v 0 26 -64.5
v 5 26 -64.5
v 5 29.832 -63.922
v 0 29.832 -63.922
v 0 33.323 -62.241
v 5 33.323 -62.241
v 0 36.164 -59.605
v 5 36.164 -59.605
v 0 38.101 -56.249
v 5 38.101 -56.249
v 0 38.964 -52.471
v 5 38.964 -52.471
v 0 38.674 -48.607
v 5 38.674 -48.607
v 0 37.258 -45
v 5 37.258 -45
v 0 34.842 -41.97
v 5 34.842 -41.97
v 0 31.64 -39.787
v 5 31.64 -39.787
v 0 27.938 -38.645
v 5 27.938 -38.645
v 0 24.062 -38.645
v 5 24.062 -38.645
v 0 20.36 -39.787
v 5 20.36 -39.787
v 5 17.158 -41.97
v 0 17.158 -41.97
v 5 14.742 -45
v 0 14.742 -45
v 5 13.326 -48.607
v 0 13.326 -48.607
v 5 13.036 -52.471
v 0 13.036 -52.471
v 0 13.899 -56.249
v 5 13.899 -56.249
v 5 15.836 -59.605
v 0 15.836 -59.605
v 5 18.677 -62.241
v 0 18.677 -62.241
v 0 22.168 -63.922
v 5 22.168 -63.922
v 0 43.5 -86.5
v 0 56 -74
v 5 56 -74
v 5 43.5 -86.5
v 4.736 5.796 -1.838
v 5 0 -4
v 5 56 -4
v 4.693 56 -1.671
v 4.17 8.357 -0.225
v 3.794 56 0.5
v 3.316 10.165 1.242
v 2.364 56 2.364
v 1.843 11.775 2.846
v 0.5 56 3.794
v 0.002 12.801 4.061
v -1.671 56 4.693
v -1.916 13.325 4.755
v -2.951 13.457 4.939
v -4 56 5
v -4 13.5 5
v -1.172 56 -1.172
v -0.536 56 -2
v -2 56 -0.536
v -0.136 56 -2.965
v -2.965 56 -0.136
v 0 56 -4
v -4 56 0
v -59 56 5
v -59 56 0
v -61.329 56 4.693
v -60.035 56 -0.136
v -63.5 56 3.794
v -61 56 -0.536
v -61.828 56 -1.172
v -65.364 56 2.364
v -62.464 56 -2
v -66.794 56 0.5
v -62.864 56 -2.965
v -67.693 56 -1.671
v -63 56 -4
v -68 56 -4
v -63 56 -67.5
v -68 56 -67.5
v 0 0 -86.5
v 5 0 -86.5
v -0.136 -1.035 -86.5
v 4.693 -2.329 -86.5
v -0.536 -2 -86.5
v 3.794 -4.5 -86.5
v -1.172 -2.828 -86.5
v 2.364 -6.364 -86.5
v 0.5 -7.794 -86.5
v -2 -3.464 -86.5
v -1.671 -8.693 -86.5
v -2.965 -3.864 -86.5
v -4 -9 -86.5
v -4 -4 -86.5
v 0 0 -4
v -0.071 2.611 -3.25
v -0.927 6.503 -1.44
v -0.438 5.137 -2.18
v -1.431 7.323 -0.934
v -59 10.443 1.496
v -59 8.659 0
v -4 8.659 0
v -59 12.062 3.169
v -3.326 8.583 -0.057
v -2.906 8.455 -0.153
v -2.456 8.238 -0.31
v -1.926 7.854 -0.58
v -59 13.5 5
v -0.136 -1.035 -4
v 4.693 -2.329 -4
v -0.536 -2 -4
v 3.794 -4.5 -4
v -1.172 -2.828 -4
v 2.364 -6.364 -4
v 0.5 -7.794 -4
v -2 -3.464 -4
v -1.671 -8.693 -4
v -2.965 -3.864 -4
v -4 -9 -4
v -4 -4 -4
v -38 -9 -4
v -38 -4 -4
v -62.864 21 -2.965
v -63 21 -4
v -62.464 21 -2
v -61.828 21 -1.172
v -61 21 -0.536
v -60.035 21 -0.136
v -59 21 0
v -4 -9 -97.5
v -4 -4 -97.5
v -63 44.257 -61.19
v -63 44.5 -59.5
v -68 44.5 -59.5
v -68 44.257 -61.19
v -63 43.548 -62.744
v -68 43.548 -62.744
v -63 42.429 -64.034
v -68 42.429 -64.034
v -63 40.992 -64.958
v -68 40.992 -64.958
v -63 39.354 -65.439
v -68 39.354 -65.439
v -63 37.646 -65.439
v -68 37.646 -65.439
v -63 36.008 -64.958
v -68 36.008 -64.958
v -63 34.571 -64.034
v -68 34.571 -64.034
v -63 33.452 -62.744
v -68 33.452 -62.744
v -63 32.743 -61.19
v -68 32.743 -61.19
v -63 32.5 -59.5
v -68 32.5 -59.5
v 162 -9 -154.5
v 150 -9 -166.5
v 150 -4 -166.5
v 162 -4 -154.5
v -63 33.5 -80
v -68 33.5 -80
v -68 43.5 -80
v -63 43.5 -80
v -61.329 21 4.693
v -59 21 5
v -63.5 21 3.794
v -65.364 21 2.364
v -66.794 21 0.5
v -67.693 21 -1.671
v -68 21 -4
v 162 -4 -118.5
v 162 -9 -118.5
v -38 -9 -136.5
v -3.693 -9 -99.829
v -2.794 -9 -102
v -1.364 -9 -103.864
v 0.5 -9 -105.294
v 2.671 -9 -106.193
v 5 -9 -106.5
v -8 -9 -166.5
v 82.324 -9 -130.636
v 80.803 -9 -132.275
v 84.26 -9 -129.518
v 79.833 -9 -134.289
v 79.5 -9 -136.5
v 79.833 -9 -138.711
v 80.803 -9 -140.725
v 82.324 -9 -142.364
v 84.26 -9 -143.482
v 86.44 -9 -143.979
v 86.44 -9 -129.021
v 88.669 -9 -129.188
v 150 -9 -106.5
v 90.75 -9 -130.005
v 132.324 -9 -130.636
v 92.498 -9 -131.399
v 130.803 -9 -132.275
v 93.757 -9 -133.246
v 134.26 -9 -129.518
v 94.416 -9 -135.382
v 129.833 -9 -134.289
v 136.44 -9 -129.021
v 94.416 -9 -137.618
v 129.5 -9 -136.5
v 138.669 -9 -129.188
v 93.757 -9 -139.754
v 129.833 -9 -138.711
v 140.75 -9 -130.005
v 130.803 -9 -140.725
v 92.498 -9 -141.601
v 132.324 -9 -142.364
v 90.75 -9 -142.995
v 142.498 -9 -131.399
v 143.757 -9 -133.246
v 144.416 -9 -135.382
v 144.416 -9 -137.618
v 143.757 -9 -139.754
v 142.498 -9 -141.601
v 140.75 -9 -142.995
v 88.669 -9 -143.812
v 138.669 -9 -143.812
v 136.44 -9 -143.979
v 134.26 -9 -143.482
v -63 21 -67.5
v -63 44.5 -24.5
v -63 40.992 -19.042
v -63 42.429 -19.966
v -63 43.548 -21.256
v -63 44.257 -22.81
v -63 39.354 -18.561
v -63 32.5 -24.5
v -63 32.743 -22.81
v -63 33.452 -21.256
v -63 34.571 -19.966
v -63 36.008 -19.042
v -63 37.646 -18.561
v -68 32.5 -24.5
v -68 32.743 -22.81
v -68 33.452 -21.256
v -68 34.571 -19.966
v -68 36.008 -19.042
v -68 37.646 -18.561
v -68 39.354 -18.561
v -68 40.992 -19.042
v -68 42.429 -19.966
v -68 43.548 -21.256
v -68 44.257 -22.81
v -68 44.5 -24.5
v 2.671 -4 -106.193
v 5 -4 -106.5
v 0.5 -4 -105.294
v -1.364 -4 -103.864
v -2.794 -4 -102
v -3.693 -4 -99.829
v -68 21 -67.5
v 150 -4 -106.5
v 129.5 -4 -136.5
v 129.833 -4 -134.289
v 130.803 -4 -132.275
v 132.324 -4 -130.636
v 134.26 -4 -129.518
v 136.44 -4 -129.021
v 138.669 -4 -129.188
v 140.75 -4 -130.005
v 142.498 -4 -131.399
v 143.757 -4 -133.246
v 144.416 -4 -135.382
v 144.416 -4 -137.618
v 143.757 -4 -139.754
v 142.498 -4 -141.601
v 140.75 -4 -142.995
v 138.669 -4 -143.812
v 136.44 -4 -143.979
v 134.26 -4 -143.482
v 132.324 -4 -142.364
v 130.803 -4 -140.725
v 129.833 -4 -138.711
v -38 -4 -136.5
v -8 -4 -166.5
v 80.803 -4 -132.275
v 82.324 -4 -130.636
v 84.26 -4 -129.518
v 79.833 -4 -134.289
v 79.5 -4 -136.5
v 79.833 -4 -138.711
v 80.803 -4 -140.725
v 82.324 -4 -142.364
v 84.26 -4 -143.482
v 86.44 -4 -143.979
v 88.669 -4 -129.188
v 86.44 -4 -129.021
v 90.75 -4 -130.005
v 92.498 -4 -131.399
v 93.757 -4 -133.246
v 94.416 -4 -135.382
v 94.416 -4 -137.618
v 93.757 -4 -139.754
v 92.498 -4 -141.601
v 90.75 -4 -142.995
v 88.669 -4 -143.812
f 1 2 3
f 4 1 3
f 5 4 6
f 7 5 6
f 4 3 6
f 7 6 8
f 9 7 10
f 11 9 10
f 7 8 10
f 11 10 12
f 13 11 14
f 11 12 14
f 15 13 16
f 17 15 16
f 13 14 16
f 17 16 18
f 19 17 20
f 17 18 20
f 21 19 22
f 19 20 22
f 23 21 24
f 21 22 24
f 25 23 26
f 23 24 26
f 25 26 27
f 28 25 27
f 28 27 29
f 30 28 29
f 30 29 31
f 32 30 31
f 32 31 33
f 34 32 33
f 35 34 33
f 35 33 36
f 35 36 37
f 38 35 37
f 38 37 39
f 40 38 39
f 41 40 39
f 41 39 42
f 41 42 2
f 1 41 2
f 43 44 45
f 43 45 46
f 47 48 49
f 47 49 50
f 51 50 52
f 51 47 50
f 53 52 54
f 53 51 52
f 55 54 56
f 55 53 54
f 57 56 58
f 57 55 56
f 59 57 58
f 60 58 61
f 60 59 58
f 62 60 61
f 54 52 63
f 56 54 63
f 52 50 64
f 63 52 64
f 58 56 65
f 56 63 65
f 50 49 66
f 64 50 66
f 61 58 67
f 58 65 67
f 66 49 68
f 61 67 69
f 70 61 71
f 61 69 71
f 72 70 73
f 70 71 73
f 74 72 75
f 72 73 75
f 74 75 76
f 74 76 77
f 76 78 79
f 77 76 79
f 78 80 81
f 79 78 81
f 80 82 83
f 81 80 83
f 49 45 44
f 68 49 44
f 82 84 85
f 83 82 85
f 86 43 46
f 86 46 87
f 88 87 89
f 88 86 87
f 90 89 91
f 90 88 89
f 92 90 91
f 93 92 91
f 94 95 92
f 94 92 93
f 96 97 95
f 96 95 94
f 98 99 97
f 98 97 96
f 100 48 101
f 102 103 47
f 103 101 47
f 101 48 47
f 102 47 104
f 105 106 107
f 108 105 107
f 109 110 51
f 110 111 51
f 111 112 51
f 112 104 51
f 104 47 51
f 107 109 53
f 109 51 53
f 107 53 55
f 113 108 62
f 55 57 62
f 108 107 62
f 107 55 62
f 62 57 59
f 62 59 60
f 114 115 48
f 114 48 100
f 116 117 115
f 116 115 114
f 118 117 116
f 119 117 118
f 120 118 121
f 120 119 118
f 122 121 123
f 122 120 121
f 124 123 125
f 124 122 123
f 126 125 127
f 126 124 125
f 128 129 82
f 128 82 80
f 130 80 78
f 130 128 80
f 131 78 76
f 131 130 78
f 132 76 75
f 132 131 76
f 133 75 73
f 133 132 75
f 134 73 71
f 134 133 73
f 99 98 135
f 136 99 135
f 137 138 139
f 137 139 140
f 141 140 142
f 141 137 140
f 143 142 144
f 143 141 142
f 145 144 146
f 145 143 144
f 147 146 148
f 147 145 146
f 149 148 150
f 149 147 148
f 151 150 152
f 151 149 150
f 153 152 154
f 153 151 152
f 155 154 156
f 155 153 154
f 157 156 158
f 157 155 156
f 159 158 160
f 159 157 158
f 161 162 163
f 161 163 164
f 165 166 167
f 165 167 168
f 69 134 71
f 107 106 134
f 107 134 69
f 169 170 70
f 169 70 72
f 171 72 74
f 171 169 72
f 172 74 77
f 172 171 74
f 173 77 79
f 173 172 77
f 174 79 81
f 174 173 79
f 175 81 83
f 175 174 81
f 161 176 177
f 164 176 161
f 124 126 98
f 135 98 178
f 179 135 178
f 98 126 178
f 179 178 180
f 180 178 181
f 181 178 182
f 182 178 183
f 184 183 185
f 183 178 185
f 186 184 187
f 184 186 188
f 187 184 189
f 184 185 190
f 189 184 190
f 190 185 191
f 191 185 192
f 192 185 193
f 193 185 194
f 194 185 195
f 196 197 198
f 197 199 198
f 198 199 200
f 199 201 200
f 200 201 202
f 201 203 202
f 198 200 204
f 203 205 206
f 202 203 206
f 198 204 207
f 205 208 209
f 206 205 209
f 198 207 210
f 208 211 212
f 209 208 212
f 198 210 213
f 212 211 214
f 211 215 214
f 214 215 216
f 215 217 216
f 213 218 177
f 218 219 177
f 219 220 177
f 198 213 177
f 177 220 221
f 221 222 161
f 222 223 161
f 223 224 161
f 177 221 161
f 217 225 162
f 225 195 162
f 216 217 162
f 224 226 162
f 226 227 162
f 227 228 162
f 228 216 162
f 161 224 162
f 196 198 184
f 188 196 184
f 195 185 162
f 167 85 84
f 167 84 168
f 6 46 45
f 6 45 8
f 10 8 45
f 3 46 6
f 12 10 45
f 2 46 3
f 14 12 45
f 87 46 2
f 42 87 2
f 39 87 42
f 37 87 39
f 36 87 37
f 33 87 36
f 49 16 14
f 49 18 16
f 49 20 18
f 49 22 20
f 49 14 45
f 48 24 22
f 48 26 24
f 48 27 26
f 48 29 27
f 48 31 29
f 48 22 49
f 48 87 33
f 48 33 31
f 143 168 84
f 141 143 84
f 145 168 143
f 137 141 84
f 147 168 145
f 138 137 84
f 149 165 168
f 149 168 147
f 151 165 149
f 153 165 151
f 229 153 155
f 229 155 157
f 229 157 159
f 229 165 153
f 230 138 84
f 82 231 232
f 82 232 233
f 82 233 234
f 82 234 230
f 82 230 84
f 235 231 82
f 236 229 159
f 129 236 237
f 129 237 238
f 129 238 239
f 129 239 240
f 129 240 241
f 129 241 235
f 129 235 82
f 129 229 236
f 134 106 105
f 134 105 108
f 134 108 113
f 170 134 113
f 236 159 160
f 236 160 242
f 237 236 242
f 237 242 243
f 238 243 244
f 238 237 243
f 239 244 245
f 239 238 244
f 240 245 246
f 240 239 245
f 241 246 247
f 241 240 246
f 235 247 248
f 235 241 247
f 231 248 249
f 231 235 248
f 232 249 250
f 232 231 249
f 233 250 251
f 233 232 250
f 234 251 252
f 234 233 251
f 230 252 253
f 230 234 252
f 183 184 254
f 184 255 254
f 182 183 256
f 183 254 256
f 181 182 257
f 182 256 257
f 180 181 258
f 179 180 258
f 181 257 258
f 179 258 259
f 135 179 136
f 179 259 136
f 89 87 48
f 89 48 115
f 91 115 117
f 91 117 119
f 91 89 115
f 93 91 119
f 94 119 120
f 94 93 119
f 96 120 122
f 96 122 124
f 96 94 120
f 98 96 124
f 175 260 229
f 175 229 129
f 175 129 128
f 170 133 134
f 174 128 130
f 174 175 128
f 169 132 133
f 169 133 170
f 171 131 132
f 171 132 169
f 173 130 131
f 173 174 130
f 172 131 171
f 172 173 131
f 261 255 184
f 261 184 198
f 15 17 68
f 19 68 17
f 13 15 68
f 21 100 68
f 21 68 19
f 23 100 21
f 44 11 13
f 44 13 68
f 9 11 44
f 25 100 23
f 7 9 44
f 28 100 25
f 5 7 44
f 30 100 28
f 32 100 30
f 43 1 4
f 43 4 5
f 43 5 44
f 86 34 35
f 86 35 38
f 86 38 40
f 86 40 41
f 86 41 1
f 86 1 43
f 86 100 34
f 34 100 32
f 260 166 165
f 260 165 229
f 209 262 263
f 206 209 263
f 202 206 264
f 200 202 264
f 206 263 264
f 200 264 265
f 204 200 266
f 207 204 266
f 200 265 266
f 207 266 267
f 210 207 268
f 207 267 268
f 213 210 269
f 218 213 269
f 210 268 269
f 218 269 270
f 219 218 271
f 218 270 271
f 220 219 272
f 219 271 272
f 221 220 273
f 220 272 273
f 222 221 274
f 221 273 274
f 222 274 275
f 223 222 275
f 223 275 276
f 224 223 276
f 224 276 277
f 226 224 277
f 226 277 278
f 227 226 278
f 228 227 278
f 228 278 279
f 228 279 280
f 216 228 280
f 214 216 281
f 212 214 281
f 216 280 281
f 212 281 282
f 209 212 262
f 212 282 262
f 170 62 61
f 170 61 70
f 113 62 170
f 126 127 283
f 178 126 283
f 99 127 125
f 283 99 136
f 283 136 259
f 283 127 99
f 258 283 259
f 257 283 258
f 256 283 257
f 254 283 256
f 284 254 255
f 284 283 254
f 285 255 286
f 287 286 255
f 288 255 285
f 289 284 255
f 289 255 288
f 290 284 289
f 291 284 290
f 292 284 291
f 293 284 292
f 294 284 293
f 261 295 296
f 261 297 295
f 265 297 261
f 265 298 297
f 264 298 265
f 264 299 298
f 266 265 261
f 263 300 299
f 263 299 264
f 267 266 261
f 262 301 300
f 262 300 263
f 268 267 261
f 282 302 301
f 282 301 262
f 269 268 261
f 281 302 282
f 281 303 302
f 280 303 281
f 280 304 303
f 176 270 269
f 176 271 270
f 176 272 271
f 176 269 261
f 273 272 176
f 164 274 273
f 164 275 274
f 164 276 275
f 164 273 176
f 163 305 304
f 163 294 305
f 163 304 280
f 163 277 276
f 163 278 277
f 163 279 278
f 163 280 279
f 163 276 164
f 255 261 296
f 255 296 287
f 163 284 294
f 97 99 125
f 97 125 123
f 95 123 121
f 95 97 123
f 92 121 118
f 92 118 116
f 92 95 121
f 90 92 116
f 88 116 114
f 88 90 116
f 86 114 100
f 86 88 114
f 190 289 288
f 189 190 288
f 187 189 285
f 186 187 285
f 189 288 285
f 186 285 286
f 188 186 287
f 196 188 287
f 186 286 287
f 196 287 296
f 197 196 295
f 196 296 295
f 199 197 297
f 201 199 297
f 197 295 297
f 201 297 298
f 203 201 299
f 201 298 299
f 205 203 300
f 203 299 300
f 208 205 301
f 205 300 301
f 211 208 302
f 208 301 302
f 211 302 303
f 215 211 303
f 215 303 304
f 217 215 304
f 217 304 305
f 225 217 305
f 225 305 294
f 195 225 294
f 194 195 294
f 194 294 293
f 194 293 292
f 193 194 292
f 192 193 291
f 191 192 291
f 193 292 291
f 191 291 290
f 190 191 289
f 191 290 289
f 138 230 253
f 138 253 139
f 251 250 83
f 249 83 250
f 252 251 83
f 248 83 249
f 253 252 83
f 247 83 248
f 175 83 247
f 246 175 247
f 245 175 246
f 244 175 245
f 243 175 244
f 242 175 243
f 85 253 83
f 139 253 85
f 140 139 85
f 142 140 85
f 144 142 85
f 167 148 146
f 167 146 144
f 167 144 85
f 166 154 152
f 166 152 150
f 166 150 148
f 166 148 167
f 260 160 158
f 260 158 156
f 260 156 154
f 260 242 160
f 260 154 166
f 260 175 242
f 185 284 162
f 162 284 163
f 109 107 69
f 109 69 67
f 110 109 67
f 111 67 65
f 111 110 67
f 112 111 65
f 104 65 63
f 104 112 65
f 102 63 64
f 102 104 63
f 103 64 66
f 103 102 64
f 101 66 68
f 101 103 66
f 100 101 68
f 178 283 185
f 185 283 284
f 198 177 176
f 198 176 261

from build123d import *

# Parameters (mm, degrees)
BASE_FLANGE1_DEPTH      = 56
SKETCH9_W               = 85
SKETCH9_H               = 21
CUT_EXTRUDE2_DEPTH      = 9
CUT_EXTRUDE3_DEPTH      = 10
SKETCH11_R              = 13
CUT_EXTRUDE4_DEPTH      = 10
BREAK_CORNER1_START     = -68
BREAK_CORNER1_DEPTH     = 5
BREAK_CORNER1_2_DEPTH   = 5
EDGE_FLANGE1_DEPTH      = 82.5
EDGE_FLANGE1_START      = -5
EDGE_FLANGE1_PROFILE_W  = 102.5
EDGE_FLANGE1_PROFILE_H  = 34
EDGE_FLANGE1_FLAT_DEPTH = 5
SKETCH15_W              = 200
SKETCH15_H              = 60
SKETCH15_R              = 7.5
BOSS_EXTRUDE1_DEPTH     = 5
BREAK_CORNER2_START     = -144.603336753
BREAK_CORNER2_OUTLINE_W = 46
BREAK_CORNER2_OUTLINE_H = 8
BREAK_CORNER2_DEPTH     = 21.213203436
BREAK_CORNER3_START     = -9
BREAK_CORNER3_DEPTH     = 5
CUT_EXTRUDE5_DEPTH      = 236.599766553
FILLET1_R               = 9


# Read off the part's stored shape, not the designer's step: Break-Corner1, Break-Corner2, Break-Corner3
# Sheet-metal steps are written as plain solids
with BuildPart() as part:
    # Sketch1 → Base-Flange1 (new body)
    with BuildSketch(Plane(origin=(0, 0, 0), x_dir=(1, 0, 0), z_dir=(0, 1, 0))):
        with BuildLine():
            Line((-63, 80), (-63, 4))
            ThreePointArc((-63, 4), (-61.828427125, 1.171572875), (-59, 0))
            Line((-59, 0), (-4, 0))
            ThreePointArc((-4, 0), (-1.171572875, 1.171572875), (0, 4))
            Line((0, 4), (0, 86.5))
            Line((0, 86.5), (5, 86.5))
            Line((5, 86.5), (5, 4))
            ThreePointArc((5, 4), (2.363961031, -2.363961031), (-4, -5))
            Line((-4, -5), (-59, -5))
            ThreePointArc((-59, -5), (-65.363961031, -2.363961031), (-68, 4))
            Line((-68, 4), (-68, 80))
            Line((-68, 80), (-63, 80))
        make_face()
    extrude(amount=BASE_FLANGE1_DEPTH)

    # Sketch9 → Cut-Extrude2 (cut)
    with BuildSketch(Plane.ZY.offset(68)):
        with Locations((-37.5, 10.5)):
            Rectangle(SKETCH9_W, SKETCH9_H)
    extrude(amount=-CUT_EXTRUDE2_DEPTH, mode=Mode.SUBTRACT)

    # Sketch10 → Cut-Extrude3 (cut)
    with BuildSketch(Plane(origin=(-63, 0, 0), x_dir=(0, 0, -1), z_dir=(1, 0, 0))):
        with BuildLine():
            Line((24.5, 44.5), (59.5, 44.5))
            ThreePointArc((59.5, 44.5), (65.5, 38.5), (59.5, 32.5))
            Line((59.5, 32.5), (24.5, 32.5))
            ThreePointArc((24.5, 32.5), (18.5, 38.5), (24.5, 44.5))
        make_face()
    extrude(amount=-CUT_EXTRUDE3_DEPTH, mode=Mode.SUBTRACT)

    # Sketch11 → Cut-Extrude4 (cut)
    with BuildSketch(Plane(origin=(5, 0, 0), x_dir=(0, 0, -1), z_dir=(1, 0, 0))):
        with Locations((51.5, 26)):
            Circle(SKETCH11_R)
    extrude(amount=-CUT_EXTRUDE4_DEPTH, mode=Mode.SUBTRACT)

    # Break-Corner1 outline → Break-Corner1 (cut)
    with BuildSketch(Plane.YZ.offset(BREAK_CORNER1_START)):
        Polygon((21, -80), (33.5, -80), (21, -67.5), align=None)
        Polygon((56, -67.5), (43.5, -80), (56, -80), align=None)
    extrude(amount=BREAK_CORNER1_DEPTH, mode=Mode.SUBTRACT)

    # Break-Corner1 2 outline → Break-Corner1 2 (cut)
    with BuildSketch(Plane.YZ):
        Polygon((56, -86.5), (56, -74), (43.5, -86.5), align=None)
    extrude(amount=BREAK_CORNER1_2_DEPTH, mode=Mode.SUBTRACT)

    # Edge-Flange1 bend section (across the edge) → Edge-Flange1 (add)
    with BuildSketch(Plane(origin=(0, -4, -86.5), x_dir=(0, 1, 0), z_dir=(0, 0, 1))):
        with BuildLine():
            Line((-5, 4), (0, 4))
            ThreePointArc((0, 4), (1.171572875, 1.171572875), (4, 0))
            Line((4, 0), (4, -5))
            ThreePointArc((4, -5), (-2.363961031, -2.363961031), (-5, 4))
        make_face()
    extrude(amount=EDGE_FLANGE1_DEPTH)

    # Edge-Flange1 profile (on flange) → Edge-Flange1 flat (add)
    with BuildSketch(Plane(origin=(0, -4, 0), x_dir=(0, 0, -1), z_dir=(0, 1, 0)).offset(EDGE_FLANGE1_START)):
        with Locations((55.25, 21)):
            Rectangle(EDGE_FLANGE1_PROFILE_W, EDGE_FLANGE1_PROFILE_H)
    extrude(amount=EDGE_FLANGE1_FLAT_DEPTH)

    # Sketch15 → Boss-Extrude1 (add)
    with BuildSketch(Plane(origin=(0, -4, 0), x_dir=(1, 0, 0), z_dir=(0, 1, 0))):
        with Locations((62, 136.5)):
            Rectangle(SKETCH15_W, SKETCH15_H)
        with Locations(Location((87, 136.5, 0), (0, 0, 180))):
            Circle(SKETCH15_R, mode=Mode.SUBTRACT)
        with Locations(Location((137, 136.5, 0), (0, 0, 180))):
            Circle(SKETCH15_R, mode=Mode.SUBTRACT)
    extrude(amount=-BOSS_EXTRUDE1_DEPTH)

    # Break-Corner2 outline → Break-Corner2 (cut)
    with BuildSketch(Plane(origin=(0, 0, 0), x_dir=(0.7071067811865471, 0, -0.707106781186548), z_dir=(0.707106781186548, 0, 0.707106781186547)).offset(BREAK_CORNER2_START)):
        with Locations((91, -7)):
            Rectangle(BREAK_CORNER2_OUTLINE_W, BREAK_CORNER2_OUTLINE_H)
    extrude(amount=BREAK_CORNER2_DEPTH, mode=Mode.SUBTRACT)

    # Break-Corner3 outline → Break-Corner3 (cut)
    with BuildSketch(Plane(origin=(0, 0, 0), x_dir=(1, 0, 0), z_dir=(0, 1, 0)).offset(BREAK_CORNER3_START)):
        Polygon((162, 106.5), (162, 118.5), (150, 106.5), align=None)
        Polygon((150, 166.5), (162, 154.5), (162, 166.5), align=None)
    extrude(amount=BREAK_CORNER3_DEPTH, mode=Mode.SUBTRACT)

    # Sketch16 → Cut-Extrude5 (cut, through all)
    with BuildSketch(Plane(origin=(5, 0, 0), x_dir=(0, 0, -1), z_dir=(1, 0, 0))):
        with BuildLine():
            Line((-5, 13.5), (-5, 0))
            Line((-5, 0), (4, 0))
            ThreePointArc((4, 0), (0.759222528, 7.589481685), (-5, 13.5))
        make_face()
    extrude(amount=-CUT_EXTRUDE5_DEPTH, mode=Mode.SUBTRACT)

    # Fillet1
    fillet1_edges = [part.edges().sort_by_distance(p)[0] for p in [
        (-4, -6.5, -106.5),
    ]]
    fillet(fillet1_edges, radius=FILLET1_R)


solid = part.part
